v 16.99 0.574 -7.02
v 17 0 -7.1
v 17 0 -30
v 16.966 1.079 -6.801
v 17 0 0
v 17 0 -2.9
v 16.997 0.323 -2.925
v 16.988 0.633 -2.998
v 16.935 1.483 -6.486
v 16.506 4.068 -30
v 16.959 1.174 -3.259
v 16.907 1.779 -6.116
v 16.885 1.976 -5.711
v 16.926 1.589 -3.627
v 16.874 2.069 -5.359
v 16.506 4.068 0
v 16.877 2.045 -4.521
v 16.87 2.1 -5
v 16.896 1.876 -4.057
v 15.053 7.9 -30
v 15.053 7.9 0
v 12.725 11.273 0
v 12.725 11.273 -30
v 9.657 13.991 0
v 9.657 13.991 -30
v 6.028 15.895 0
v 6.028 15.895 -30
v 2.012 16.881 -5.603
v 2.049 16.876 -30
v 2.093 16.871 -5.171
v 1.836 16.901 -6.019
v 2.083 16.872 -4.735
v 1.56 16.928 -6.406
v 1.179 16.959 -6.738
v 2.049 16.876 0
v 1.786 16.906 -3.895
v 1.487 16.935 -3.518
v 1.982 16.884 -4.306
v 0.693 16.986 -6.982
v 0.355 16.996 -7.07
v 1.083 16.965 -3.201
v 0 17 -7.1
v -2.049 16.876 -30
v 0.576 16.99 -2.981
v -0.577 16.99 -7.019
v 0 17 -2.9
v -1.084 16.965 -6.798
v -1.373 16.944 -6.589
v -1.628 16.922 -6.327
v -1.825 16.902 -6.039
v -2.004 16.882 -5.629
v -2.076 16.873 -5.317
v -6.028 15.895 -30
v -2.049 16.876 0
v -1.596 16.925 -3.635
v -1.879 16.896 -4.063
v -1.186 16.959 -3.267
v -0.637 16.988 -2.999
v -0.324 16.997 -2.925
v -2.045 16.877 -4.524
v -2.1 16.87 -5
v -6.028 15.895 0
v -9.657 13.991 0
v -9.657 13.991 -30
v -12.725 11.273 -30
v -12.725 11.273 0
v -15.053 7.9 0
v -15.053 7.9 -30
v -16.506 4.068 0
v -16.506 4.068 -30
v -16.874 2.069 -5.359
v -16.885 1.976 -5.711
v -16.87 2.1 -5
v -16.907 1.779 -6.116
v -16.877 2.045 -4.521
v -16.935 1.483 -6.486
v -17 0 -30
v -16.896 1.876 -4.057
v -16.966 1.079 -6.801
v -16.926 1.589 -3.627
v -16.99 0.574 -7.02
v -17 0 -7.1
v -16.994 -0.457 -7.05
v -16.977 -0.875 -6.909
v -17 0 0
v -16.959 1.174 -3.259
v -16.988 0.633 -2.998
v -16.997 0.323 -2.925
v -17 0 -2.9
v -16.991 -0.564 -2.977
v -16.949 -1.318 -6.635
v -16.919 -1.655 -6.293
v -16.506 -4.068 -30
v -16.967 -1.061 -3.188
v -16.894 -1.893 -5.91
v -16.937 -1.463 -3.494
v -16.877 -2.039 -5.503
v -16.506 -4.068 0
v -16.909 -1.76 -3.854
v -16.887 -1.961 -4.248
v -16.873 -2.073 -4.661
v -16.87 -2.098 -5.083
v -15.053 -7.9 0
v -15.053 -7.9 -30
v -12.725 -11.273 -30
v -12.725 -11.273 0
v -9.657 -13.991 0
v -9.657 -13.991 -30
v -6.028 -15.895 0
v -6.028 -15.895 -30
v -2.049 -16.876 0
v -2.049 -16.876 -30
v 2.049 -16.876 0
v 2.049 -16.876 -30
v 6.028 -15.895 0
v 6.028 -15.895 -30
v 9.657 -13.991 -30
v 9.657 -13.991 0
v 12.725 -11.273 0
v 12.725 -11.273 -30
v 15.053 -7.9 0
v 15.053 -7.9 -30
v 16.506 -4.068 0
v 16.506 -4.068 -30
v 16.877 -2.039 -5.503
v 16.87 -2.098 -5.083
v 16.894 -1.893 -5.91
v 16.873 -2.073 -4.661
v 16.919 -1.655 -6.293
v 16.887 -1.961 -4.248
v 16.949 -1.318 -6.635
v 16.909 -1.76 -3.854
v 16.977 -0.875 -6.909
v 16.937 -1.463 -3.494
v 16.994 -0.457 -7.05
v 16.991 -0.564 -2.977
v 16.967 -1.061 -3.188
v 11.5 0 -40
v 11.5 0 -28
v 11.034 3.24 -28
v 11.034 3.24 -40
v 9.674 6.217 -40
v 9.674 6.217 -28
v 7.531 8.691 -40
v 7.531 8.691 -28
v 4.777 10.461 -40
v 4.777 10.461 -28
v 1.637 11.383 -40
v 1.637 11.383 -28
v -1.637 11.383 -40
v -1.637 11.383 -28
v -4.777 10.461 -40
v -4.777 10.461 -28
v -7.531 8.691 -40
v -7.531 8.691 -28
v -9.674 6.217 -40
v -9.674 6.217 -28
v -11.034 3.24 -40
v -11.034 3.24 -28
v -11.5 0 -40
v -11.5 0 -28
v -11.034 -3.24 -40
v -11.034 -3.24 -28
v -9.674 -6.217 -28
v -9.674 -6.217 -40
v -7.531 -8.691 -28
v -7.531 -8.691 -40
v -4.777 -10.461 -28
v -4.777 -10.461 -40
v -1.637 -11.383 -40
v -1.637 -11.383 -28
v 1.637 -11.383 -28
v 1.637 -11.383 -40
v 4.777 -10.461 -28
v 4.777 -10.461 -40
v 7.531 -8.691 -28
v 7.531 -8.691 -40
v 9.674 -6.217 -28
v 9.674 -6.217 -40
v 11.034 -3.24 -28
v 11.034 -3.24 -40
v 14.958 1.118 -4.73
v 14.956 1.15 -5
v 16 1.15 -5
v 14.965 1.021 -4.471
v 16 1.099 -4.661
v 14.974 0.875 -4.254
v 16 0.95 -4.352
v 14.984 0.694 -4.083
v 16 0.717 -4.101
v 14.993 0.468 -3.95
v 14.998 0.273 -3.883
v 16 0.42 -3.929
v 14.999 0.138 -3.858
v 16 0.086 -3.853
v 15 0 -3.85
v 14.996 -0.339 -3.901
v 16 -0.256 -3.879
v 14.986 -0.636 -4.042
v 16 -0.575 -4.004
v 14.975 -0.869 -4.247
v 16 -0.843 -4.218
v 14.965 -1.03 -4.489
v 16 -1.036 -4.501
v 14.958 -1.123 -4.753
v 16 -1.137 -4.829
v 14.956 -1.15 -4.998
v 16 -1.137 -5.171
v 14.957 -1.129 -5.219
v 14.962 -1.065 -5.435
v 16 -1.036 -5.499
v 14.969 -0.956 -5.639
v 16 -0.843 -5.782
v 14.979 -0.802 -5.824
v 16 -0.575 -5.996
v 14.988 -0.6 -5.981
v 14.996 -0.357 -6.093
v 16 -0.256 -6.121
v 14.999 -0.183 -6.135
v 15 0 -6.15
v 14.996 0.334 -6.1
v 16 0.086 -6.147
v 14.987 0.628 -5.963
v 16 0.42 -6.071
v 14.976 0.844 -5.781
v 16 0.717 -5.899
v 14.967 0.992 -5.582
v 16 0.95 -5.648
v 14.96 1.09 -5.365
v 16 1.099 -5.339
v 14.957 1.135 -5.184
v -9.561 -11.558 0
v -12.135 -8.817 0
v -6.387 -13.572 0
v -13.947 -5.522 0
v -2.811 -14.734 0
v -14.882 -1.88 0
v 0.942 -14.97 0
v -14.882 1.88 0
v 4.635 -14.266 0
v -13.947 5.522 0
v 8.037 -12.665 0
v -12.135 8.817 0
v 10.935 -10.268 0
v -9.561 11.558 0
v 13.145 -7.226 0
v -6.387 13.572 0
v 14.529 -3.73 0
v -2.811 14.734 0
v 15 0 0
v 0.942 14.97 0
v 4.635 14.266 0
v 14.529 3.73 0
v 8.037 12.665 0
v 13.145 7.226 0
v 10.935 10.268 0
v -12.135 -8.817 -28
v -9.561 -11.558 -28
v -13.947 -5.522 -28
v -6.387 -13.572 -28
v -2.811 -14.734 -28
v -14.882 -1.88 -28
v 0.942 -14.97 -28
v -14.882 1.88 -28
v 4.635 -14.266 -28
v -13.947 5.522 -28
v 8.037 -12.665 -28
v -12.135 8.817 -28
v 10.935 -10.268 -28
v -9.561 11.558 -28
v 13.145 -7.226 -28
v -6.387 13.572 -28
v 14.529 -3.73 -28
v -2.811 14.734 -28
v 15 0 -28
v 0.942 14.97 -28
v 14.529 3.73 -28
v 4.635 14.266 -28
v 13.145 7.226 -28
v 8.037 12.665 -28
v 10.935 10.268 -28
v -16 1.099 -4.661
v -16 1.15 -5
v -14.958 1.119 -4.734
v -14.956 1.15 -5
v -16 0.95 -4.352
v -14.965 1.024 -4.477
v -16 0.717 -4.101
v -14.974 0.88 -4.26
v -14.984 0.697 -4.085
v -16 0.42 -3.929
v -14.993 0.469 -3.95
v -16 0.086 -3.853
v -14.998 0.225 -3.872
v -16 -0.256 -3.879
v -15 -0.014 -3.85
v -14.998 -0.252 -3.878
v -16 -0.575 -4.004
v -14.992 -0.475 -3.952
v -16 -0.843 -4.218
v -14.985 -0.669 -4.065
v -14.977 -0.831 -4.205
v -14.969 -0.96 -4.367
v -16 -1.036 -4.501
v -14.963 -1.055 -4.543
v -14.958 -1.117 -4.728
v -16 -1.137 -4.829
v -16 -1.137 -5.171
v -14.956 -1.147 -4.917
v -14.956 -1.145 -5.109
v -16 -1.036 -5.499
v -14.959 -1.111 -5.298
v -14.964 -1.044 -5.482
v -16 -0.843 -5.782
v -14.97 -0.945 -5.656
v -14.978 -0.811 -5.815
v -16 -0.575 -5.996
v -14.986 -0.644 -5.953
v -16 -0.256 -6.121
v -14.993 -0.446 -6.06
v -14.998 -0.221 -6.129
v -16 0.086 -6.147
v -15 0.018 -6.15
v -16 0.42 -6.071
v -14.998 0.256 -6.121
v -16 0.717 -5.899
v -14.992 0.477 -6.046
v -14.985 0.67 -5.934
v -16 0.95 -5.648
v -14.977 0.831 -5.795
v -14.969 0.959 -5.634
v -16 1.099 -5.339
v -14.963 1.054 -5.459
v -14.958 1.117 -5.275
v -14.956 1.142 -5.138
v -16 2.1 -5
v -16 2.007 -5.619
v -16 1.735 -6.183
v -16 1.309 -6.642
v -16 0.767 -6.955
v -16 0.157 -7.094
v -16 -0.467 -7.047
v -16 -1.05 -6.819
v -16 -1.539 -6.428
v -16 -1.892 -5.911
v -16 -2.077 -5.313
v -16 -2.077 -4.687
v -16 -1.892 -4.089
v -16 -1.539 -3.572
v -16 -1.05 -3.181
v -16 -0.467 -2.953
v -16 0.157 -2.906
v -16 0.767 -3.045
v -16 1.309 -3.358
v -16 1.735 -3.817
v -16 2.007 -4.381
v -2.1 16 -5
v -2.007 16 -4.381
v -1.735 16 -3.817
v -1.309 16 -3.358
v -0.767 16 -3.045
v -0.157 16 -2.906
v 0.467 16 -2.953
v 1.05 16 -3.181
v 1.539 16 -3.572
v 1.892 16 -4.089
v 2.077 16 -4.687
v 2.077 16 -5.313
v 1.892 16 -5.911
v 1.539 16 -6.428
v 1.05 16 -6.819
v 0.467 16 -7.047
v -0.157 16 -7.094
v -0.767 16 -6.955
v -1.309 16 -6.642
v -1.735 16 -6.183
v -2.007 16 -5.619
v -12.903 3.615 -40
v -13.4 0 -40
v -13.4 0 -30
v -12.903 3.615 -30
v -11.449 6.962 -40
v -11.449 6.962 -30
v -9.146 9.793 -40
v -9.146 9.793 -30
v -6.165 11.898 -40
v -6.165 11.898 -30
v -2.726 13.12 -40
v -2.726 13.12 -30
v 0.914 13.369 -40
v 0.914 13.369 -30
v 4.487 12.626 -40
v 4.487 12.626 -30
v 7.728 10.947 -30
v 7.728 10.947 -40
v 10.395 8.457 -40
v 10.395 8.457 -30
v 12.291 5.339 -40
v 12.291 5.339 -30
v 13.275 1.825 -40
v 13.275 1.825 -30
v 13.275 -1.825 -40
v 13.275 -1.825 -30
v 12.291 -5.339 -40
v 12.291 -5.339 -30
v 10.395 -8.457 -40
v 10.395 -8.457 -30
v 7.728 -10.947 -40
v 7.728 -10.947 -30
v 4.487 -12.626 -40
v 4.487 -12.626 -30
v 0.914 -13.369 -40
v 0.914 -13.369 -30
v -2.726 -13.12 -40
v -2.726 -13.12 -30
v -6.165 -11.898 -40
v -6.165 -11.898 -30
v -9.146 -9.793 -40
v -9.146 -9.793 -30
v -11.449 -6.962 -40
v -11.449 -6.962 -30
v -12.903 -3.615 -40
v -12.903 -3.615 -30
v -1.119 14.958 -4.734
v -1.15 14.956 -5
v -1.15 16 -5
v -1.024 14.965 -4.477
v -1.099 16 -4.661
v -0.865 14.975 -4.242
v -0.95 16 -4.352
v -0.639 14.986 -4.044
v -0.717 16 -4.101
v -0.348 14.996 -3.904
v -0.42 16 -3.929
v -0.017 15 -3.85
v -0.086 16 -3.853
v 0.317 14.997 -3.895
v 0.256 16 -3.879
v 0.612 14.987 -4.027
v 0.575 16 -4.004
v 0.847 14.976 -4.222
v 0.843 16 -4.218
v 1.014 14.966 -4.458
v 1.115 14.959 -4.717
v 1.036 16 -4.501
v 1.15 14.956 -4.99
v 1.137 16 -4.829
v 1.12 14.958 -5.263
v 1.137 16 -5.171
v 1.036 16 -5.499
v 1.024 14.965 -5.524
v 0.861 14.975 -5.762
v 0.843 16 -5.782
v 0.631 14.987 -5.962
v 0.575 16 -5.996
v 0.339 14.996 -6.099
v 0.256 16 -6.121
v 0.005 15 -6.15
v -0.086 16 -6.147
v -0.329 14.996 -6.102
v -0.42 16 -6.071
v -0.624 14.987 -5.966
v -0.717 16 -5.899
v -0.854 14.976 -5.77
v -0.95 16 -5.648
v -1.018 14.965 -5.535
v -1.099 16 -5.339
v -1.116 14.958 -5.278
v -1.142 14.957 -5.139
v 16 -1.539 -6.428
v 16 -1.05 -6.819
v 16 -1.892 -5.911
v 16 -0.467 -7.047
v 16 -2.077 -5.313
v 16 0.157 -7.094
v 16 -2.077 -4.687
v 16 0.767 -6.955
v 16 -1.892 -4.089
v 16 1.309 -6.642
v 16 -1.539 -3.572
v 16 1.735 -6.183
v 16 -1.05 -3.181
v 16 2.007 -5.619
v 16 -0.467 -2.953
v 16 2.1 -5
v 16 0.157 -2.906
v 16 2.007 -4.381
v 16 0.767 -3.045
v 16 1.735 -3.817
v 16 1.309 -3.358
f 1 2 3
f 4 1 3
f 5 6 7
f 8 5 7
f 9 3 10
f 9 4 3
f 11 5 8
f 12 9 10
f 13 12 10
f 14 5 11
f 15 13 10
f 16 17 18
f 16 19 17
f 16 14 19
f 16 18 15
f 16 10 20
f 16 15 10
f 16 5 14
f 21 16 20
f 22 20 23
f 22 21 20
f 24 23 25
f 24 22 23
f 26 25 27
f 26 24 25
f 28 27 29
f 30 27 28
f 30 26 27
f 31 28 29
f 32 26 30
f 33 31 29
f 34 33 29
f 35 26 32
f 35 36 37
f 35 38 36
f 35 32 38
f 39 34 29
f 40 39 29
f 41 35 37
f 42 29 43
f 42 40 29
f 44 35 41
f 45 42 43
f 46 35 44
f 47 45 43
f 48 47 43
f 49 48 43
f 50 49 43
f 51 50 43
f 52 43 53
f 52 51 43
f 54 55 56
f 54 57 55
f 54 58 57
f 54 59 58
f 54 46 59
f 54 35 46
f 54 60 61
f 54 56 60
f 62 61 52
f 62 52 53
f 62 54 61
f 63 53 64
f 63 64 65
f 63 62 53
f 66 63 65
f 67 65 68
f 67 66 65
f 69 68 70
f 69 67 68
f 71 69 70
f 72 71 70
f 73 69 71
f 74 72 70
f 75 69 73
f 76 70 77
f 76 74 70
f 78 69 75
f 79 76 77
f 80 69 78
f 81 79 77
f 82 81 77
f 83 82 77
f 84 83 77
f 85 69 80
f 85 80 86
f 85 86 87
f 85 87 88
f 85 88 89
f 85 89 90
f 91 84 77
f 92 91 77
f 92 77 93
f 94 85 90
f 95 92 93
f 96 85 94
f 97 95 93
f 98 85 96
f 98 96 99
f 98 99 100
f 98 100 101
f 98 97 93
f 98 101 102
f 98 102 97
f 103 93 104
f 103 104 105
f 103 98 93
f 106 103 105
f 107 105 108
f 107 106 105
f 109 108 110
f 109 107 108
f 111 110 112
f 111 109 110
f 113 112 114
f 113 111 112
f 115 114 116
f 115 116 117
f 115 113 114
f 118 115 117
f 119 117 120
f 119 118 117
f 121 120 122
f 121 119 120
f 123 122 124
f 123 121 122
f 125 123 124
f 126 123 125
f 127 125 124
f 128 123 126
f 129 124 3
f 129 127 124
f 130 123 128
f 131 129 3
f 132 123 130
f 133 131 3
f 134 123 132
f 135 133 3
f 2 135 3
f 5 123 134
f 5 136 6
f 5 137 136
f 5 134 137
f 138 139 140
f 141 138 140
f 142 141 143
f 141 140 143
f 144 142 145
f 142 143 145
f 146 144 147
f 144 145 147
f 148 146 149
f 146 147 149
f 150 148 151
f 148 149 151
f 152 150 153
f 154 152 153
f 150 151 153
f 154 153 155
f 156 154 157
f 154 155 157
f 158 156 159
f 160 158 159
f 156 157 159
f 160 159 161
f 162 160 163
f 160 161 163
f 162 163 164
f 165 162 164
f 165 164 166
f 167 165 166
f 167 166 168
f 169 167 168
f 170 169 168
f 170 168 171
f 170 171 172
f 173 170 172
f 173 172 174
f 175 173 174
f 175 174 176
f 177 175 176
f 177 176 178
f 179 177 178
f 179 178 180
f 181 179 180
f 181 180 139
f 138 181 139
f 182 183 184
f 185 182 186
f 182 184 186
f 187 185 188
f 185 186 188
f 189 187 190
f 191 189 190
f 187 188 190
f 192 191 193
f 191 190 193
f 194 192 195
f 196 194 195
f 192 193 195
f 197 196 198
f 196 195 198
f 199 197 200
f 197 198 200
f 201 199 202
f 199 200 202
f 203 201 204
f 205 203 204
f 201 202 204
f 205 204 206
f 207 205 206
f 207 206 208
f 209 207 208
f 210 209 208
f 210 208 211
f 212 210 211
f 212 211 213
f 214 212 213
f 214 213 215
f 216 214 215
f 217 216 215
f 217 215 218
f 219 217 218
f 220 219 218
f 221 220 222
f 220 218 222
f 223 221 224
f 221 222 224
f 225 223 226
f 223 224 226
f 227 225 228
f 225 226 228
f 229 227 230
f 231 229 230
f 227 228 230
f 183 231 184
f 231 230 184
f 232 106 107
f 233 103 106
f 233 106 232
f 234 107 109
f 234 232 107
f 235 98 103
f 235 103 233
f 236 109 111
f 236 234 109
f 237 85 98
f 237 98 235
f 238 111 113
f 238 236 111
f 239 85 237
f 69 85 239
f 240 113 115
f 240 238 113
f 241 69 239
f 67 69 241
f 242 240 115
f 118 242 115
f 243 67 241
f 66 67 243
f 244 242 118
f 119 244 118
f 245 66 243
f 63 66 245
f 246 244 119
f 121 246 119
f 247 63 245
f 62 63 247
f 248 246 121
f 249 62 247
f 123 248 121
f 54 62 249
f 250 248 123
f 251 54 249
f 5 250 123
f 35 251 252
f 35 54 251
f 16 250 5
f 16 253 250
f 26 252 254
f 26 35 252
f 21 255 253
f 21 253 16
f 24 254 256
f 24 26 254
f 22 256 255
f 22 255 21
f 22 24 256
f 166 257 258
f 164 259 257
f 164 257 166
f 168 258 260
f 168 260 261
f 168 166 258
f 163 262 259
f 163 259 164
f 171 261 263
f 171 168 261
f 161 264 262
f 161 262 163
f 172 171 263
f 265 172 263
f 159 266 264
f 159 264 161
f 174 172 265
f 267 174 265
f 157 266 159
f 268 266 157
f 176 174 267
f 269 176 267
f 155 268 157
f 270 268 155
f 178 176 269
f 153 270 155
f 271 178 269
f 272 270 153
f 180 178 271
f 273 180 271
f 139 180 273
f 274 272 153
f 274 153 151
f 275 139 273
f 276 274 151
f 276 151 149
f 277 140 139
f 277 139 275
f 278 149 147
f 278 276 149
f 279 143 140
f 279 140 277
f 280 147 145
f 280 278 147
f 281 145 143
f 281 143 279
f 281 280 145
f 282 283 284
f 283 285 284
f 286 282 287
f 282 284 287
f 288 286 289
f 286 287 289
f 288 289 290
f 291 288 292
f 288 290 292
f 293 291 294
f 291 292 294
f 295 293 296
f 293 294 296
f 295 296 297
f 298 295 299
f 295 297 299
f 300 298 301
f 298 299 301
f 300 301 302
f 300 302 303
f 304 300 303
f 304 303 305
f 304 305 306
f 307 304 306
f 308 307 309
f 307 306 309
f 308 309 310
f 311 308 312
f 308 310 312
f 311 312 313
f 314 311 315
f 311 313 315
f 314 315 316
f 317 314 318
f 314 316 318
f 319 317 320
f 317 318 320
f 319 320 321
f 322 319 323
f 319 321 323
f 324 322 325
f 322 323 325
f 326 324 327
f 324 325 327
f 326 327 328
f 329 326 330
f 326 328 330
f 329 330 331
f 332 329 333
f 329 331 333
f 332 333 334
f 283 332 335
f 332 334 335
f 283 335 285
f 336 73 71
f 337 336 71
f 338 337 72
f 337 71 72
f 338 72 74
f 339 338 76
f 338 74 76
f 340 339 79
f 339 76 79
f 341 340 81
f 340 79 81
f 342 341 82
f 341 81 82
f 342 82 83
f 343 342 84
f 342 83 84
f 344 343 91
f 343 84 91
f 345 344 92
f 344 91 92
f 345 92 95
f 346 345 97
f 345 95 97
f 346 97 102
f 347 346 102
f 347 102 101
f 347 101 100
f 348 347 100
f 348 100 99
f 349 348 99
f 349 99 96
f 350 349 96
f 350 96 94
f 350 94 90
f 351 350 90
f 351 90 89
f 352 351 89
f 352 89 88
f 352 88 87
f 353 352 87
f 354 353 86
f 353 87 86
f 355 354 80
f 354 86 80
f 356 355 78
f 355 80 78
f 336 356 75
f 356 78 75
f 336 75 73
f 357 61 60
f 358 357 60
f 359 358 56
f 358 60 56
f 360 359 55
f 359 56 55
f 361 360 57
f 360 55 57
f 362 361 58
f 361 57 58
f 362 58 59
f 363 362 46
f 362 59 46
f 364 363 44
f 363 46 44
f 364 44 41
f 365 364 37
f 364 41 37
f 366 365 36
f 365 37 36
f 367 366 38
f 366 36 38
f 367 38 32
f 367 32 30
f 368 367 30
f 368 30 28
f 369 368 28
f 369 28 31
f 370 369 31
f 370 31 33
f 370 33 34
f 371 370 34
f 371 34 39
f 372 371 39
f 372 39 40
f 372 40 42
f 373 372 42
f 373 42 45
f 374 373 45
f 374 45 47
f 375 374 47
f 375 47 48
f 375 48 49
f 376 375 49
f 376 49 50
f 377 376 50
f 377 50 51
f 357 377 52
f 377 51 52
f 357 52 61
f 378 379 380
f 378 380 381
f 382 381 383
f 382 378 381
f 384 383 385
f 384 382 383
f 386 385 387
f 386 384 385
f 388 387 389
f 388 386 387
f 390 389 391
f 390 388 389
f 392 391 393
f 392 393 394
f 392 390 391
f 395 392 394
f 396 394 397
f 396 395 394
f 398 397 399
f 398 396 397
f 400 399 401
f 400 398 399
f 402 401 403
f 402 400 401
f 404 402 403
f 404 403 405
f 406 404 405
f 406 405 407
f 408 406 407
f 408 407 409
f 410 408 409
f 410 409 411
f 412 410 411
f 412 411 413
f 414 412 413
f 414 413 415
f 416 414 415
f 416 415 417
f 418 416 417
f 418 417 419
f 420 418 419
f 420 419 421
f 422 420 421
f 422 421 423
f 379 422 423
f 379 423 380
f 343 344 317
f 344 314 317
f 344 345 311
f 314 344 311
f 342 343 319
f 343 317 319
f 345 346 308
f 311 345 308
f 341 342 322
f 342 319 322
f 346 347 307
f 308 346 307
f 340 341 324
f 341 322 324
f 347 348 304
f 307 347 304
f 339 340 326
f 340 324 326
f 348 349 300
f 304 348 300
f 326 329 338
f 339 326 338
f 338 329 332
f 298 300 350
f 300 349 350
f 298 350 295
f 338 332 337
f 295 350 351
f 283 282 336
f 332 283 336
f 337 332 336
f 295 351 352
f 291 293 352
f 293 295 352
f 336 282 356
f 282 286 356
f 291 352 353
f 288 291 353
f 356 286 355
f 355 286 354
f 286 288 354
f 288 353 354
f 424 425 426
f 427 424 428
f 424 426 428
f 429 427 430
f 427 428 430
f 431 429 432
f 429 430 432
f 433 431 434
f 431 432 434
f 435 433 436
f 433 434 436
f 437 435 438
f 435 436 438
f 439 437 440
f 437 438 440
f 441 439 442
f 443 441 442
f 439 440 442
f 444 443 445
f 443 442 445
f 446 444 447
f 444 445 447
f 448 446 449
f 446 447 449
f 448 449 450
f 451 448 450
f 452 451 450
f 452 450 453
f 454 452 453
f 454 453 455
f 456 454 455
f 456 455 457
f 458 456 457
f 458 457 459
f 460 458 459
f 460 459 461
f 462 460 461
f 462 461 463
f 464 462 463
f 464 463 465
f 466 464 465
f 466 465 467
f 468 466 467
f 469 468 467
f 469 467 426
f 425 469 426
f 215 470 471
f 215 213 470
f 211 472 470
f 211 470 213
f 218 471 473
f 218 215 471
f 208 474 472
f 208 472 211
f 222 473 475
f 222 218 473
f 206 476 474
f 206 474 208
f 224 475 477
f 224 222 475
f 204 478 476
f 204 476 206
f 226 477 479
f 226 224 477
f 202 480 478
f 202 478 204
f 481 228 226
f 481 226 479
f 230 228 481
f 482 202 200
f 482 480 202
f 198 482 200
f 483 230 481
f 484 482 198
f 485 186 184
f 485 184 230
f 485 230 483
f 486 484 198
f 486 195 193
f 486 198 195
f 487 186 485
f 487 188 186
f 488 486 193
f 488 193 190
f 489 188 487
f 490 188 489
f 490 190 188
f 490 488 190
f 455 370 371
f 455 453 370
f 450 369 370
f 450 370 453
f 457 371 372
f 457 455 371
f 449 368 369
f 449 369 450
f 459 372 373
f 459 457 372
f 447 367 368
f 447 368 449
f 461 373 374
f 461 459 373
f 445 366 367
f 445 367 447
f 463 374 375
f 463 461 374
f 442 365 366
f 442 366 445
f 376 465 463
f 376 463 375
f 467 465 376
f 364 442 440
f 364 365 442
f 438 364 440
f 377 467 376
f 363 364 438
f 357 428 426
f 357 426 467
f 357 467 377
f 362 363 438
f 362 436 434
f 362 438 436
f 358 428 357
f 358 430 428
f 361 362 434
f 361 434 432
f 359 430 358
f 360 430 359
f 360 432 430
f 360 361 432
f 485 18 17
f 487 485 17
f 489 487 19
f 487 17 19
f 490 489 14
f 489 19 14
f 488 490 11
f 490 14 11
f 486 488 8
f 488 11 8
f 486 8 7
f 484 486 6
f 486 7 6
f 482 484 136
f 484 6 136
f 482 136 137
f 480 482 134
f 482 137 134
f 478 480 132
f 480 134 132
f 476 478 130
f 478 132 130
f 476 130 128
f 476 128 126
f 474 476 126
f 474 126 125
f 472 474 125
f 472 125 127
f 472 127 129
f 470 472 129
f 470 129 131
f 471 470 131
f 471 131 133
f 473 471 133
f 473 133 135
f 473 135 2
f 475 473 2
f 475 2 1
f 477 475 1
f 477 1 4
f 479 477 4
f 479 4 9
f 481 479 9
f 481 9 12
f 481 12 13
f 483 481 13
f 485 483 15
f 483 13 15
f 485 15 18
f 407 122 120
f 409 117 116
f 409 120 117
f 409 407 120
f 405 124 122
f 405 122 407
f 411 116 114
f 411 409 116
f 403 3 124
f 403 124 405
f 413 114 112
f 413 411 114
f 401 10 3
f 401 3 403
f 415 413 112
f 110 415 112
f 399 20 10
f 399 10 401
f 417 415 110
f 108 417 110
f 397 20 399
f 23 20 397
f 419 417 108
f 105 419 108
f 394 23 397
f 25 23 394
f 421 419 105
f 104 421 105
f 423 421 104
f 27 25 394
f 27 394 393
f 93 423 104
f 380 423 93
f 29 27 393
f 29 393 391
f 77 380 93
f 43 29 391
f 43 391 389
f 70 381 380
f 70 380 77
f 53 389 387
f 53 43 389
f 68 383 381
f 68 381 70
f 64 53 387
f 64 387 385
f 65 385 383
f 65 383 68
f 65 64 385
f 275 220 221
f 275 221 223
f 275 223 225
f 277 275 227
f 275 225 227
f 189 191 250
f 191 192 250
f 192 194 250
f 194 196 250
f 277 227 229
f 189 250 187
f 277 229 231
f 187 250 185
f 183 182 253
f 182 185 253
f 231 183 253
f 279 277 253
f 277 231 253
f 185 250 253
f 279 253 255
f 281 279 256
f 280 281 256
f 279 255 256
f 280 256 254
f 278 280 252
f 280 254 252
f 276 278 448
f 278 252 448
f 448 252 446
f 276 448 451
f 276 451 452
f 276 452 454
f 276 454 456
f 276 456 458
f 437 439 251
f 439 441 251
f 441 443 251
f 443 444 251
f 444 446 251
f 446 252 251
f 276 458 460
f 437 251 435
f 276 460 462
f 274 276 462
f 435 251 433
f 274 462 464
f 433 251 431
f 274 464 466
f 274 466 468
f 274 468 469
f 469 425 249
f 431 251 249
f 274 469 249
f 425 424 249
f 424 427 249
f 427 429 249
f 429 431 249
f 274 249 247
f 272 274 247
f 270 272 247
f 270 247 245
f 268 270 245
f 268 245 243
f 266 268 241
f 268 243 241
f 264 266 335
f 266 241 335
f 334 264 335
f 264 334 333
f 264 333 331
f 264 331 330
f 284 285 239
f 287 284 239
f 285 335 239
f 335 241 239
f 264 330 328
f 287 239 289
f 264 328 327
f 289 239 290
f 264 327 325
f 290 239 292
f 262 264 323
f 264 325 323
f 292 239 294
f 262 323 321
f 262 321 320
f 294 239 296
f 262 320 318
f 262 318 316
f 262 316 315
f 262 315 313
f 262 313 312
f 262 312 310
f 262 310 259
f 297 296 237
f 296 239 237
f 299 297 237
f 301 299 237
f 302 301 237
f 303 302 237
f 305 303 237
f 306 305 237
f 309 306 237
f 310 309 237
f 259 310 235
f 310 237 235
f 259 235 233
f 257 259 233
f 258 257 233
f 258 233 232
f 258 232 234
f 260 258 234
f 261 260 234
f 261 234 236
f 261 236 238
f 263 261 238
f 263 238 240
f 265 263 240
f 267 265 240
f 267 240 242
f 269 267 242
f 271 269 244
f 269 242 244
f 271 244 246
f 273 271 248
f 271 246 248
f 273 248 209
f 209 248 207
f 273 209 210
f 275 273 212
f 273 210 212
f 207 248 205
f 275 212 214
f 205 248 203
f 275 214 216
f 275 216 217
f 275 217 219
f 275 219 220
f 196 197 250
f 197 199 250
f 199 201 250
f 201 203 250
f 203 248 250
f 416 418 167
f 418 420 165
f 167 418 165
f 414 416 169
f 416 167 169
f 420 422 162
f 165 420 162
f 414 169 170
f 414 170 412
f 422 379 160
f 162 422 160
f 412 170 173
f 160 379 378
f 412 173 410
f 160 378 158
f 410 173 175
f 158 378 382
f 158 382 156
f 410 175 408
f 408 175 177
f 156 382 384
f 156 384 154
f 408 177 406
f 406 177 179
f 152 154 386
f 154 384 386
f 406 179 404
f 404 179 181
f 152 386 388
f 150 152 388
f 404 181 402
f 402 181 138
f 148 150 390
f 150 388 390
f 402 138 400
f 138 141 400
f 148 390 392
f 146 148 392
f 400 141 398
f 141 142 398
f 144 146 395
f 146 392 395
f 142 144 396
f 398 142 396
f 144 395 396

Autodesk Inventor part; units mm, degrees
sketch "スケッチ1" plane through (0, 0, 0) normal (0, 0, 1) x (1, 0, 0)
  circle A0 centre (0, 0) radius 17
  circle A1 centre (0, 0) radius 11.5
  dimension "d0" = 34
  dimension "d1" = 23
extrude "押し出し1" add sketch "スケッチ1" against normal blind 40
sketch "スケッチ3" plane through (0, 0, 0) normal (0, 0, 1) x (1, 0, 0)
  circle A0 centre (0, 0) radius 15
  dimension "d8" = 30
extrude "押し出し3" cut sketch "スケッチ3" against normal blind 28
ref_plane "作業平面6" through (17, 0, 0) normal (1, 0, 0) x (0, 1, 0)
ref_plane "作業平面7" through (-17, 0, 0) normal (1, 0, 0) x (0, 1, 0)
sketch "スケッチ14" plane through (17, 0, 0) normal (1, 0, 0) x (0, 1, 0)
  point P0 (0, 0)
sketch "スケッチ15" plane through (17, 0, 0) normal (1, 0, 0) x (0, 1, 0)
  circle A0 centre (0, -5) radius 1.15
  point P0 (0, 0)
  dimension "d54" = 2.3
  dimension "d55" = 5
ref_plane "作業平面8" through (0, 17, 0) normal (0, 1, 0) x (-1, 0, 0)
ref_plane "作業平面9" through (0, -17, 0) normal (0, 1, 0) x (-1, 0, 0)
sketch "スケッチ16" plane through (0, 17, 0) normal (0, 1, 0) x (-1, 0, 0)
  circle A0 centre (0, -5) radius 1.15
  point P0 (0, 0)
  dimension "d58" = 2.3
  dimension "d59" = 5
extrude "押し出し13" cut sketch "スケッチ15" against normal through all
extrude "押し出し14" cut sketch "スケッチ16" against normal blind 5
sketch "スケッチ19" plane through (17, 0, 0) normal (1, 0, 0) x (0, 1, 0)
  circle A0 centre (0, -5) radius 2.1
  line L0 (17, 0) -> (-17, 0) projected
  point P0 (0, 0)
  dimension "d64" = 4.2
  dimension "d65" = 5
extrude "押し出し15" cut sketch "スケッチ19" against normal blind 1
sketch "スケッチ20" plane through (0, 17, 0) normal (0, 1, 0) x (-1, 0, 0)
  circle A0 centre (0, -5) radius 2.1
  line L0 (17, 0) -> (-17, 0) projected
  point P0 (0, 0)
  dimension "d68" = 4.2
  dimension "d69" = 5
extrude "押し出し16" cut sketch "スケッチ20" against normal blind 1
sketch "スケッチ21" plane through (-17, 0, 0) normal (1, 0, 0) x (0, 1, 0)
  circle A0 centre (0, -5) radius 2.1
  line L0 (17, 0) -> (-17, 0) projected
  point P0 (0, 0)
  dimension "d72" = 4.2
  dimension "d73" = 5
extrude "押し出し17" cut sketch "スケッチ21" along normal blind 1
sketch "スケッチ22" plane through (0, -17, 0) normal (0, 1, 0) x (-1, 0, 0)
  point P0 (0, 0)
sketch "スケッチ24" plane through (0, 0, -40) normal (0, 0, -1) x (-1, 0, 0)
  circle A0 centre (0, 0) radius 17
  circle A1 centre (0, 0) radius 13.4
  dimension "d80" = 26.8
  dimension "d83" = 34
extrude "押し出し19" cut sketch "スケッチ24" against normal blind 10
equation "\"BendRadius\" = Thickness"
equation "\"BendReliefWidth\" = Thickness"
equation "\"BendReliefDepth\" = 0.5 * Thickness"
equation "\"CornerReliefSize\" = 4 * Thickness"
equation "\"MinimumRemnant\" = 2 * Thickness"
equation "\"TransitionRadius\" = BendRadius"
equation "\"JacobiRadiusSize\" = BendRadius"
equation "\"GapSize\" = Thickness"
equation "\"Thickness\" = 3.048"
properties part number "B_pipe_adapter_1" material "ステンレス鋼 440C"
